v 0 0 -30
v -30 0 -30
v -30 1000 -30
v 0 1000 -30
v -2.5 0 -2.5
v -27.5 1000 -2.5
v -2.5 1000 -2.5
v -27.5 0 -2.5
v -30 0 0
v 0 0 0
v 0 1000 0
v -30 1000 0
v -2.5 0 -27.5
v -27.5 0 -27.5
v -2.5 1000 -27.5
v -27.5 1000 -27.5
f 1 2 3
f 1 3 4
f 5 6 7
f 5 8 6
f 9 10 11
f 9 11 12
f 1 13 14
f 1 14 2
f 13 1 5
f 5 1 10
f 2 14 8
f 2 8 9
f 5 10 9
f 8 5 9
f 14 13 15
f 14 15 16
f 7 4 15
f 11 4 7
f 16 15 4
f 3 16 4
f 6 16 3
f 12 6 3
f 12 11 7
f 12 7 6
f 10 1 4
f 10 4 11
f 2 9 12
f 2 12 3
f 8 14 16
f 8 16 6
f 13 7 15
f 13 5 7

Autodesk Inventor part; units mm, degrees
ref_plane "YZ Plane" through (0, 0, 0) normal (1, 0, 0) x (0, 1, 0)
ref_plane "XZ Plane" through (0, 0, 0) normal (0, 1, 0) x (-1, 0, 0)
ref_plane "XY Plane" through (0, 0, 0) normal (0, 0, 1) x (1, 0, 0)
sketch "Sketch1" plane through (0, 0, 0) normal (0, 1, 0) x (-1, 0, 0)
  line L0 (0, 0) -> (30, 0)
  line L1 (30, 0) -> (30, -30)
  line L2 (30, -30) -> (0, -30)
  line L3 (0, -30) -> (0, 0)
  line L4 (30, -15) -> (0, -15) construction
  line L5 (15, -30) -> (15, 0) construction
  line L6 (27.5, -2.5) -> (2.5, -2.5)
  line L7 (2.5, -2.5) -> (2.5, -27.5)
  line L8 (2.5, -27.5) -> (27.5, -27.5)
  line L9 (27.5, -27.5) -> (27.5, -2.5)
  dimension "d0" = 30
  dimension "d1" = 30
  dimension "d2" = 2.5
  dimension "d3" = 2.5
extrude "Extrusion1" add sketch "Sketch1" along normal blind 1000
sketch "Sketch2" plane through (0, 0, 0) normal (1, 0, 0) x (0, 0, -1)
  line L0 (30, 0) -> (0, 0) construction
  line L1 (30, 0) -> (30, 1000) construction
  line L2 (0, 1000) -> (30, 1000) construction
  line L3 (0, 0) -> (0, 1000) construction
  line L4 (0, 0) -> (0, 1000) construction
  line L5 (0, 125) -> (30, 125) construction
  line L6 (30, 0) -> (30, 1000) construction
  dimension "d6" = 125
sketch "Sketch3" plane through (-30, 0, -30) normal (-1, 0, 0) x (0, 0, 1)
  line L0 (30, 0) -> (0, 0) construction
  line L1 (30, 0) -> (30, 1000) construction
  line L2 (0, 1000) -> (30, 1000) construction
  line L3 (0, 0) -> (0, 1000) construction
  line L4 (30, 125) -> (0, 125) construction
  line L5 (30, 0) -> (30, 1000) construction
  line L6 (30, 875) -> (1.3146, 875) construction
  line L7 (0, 0) -> (0, 1000) construction
  dimension "d7" = 125
equation "\"d0\" = d1"
equation "\"d3\" = d2"
properties part number "1250mm_box_section" material "Steel, Mild"
